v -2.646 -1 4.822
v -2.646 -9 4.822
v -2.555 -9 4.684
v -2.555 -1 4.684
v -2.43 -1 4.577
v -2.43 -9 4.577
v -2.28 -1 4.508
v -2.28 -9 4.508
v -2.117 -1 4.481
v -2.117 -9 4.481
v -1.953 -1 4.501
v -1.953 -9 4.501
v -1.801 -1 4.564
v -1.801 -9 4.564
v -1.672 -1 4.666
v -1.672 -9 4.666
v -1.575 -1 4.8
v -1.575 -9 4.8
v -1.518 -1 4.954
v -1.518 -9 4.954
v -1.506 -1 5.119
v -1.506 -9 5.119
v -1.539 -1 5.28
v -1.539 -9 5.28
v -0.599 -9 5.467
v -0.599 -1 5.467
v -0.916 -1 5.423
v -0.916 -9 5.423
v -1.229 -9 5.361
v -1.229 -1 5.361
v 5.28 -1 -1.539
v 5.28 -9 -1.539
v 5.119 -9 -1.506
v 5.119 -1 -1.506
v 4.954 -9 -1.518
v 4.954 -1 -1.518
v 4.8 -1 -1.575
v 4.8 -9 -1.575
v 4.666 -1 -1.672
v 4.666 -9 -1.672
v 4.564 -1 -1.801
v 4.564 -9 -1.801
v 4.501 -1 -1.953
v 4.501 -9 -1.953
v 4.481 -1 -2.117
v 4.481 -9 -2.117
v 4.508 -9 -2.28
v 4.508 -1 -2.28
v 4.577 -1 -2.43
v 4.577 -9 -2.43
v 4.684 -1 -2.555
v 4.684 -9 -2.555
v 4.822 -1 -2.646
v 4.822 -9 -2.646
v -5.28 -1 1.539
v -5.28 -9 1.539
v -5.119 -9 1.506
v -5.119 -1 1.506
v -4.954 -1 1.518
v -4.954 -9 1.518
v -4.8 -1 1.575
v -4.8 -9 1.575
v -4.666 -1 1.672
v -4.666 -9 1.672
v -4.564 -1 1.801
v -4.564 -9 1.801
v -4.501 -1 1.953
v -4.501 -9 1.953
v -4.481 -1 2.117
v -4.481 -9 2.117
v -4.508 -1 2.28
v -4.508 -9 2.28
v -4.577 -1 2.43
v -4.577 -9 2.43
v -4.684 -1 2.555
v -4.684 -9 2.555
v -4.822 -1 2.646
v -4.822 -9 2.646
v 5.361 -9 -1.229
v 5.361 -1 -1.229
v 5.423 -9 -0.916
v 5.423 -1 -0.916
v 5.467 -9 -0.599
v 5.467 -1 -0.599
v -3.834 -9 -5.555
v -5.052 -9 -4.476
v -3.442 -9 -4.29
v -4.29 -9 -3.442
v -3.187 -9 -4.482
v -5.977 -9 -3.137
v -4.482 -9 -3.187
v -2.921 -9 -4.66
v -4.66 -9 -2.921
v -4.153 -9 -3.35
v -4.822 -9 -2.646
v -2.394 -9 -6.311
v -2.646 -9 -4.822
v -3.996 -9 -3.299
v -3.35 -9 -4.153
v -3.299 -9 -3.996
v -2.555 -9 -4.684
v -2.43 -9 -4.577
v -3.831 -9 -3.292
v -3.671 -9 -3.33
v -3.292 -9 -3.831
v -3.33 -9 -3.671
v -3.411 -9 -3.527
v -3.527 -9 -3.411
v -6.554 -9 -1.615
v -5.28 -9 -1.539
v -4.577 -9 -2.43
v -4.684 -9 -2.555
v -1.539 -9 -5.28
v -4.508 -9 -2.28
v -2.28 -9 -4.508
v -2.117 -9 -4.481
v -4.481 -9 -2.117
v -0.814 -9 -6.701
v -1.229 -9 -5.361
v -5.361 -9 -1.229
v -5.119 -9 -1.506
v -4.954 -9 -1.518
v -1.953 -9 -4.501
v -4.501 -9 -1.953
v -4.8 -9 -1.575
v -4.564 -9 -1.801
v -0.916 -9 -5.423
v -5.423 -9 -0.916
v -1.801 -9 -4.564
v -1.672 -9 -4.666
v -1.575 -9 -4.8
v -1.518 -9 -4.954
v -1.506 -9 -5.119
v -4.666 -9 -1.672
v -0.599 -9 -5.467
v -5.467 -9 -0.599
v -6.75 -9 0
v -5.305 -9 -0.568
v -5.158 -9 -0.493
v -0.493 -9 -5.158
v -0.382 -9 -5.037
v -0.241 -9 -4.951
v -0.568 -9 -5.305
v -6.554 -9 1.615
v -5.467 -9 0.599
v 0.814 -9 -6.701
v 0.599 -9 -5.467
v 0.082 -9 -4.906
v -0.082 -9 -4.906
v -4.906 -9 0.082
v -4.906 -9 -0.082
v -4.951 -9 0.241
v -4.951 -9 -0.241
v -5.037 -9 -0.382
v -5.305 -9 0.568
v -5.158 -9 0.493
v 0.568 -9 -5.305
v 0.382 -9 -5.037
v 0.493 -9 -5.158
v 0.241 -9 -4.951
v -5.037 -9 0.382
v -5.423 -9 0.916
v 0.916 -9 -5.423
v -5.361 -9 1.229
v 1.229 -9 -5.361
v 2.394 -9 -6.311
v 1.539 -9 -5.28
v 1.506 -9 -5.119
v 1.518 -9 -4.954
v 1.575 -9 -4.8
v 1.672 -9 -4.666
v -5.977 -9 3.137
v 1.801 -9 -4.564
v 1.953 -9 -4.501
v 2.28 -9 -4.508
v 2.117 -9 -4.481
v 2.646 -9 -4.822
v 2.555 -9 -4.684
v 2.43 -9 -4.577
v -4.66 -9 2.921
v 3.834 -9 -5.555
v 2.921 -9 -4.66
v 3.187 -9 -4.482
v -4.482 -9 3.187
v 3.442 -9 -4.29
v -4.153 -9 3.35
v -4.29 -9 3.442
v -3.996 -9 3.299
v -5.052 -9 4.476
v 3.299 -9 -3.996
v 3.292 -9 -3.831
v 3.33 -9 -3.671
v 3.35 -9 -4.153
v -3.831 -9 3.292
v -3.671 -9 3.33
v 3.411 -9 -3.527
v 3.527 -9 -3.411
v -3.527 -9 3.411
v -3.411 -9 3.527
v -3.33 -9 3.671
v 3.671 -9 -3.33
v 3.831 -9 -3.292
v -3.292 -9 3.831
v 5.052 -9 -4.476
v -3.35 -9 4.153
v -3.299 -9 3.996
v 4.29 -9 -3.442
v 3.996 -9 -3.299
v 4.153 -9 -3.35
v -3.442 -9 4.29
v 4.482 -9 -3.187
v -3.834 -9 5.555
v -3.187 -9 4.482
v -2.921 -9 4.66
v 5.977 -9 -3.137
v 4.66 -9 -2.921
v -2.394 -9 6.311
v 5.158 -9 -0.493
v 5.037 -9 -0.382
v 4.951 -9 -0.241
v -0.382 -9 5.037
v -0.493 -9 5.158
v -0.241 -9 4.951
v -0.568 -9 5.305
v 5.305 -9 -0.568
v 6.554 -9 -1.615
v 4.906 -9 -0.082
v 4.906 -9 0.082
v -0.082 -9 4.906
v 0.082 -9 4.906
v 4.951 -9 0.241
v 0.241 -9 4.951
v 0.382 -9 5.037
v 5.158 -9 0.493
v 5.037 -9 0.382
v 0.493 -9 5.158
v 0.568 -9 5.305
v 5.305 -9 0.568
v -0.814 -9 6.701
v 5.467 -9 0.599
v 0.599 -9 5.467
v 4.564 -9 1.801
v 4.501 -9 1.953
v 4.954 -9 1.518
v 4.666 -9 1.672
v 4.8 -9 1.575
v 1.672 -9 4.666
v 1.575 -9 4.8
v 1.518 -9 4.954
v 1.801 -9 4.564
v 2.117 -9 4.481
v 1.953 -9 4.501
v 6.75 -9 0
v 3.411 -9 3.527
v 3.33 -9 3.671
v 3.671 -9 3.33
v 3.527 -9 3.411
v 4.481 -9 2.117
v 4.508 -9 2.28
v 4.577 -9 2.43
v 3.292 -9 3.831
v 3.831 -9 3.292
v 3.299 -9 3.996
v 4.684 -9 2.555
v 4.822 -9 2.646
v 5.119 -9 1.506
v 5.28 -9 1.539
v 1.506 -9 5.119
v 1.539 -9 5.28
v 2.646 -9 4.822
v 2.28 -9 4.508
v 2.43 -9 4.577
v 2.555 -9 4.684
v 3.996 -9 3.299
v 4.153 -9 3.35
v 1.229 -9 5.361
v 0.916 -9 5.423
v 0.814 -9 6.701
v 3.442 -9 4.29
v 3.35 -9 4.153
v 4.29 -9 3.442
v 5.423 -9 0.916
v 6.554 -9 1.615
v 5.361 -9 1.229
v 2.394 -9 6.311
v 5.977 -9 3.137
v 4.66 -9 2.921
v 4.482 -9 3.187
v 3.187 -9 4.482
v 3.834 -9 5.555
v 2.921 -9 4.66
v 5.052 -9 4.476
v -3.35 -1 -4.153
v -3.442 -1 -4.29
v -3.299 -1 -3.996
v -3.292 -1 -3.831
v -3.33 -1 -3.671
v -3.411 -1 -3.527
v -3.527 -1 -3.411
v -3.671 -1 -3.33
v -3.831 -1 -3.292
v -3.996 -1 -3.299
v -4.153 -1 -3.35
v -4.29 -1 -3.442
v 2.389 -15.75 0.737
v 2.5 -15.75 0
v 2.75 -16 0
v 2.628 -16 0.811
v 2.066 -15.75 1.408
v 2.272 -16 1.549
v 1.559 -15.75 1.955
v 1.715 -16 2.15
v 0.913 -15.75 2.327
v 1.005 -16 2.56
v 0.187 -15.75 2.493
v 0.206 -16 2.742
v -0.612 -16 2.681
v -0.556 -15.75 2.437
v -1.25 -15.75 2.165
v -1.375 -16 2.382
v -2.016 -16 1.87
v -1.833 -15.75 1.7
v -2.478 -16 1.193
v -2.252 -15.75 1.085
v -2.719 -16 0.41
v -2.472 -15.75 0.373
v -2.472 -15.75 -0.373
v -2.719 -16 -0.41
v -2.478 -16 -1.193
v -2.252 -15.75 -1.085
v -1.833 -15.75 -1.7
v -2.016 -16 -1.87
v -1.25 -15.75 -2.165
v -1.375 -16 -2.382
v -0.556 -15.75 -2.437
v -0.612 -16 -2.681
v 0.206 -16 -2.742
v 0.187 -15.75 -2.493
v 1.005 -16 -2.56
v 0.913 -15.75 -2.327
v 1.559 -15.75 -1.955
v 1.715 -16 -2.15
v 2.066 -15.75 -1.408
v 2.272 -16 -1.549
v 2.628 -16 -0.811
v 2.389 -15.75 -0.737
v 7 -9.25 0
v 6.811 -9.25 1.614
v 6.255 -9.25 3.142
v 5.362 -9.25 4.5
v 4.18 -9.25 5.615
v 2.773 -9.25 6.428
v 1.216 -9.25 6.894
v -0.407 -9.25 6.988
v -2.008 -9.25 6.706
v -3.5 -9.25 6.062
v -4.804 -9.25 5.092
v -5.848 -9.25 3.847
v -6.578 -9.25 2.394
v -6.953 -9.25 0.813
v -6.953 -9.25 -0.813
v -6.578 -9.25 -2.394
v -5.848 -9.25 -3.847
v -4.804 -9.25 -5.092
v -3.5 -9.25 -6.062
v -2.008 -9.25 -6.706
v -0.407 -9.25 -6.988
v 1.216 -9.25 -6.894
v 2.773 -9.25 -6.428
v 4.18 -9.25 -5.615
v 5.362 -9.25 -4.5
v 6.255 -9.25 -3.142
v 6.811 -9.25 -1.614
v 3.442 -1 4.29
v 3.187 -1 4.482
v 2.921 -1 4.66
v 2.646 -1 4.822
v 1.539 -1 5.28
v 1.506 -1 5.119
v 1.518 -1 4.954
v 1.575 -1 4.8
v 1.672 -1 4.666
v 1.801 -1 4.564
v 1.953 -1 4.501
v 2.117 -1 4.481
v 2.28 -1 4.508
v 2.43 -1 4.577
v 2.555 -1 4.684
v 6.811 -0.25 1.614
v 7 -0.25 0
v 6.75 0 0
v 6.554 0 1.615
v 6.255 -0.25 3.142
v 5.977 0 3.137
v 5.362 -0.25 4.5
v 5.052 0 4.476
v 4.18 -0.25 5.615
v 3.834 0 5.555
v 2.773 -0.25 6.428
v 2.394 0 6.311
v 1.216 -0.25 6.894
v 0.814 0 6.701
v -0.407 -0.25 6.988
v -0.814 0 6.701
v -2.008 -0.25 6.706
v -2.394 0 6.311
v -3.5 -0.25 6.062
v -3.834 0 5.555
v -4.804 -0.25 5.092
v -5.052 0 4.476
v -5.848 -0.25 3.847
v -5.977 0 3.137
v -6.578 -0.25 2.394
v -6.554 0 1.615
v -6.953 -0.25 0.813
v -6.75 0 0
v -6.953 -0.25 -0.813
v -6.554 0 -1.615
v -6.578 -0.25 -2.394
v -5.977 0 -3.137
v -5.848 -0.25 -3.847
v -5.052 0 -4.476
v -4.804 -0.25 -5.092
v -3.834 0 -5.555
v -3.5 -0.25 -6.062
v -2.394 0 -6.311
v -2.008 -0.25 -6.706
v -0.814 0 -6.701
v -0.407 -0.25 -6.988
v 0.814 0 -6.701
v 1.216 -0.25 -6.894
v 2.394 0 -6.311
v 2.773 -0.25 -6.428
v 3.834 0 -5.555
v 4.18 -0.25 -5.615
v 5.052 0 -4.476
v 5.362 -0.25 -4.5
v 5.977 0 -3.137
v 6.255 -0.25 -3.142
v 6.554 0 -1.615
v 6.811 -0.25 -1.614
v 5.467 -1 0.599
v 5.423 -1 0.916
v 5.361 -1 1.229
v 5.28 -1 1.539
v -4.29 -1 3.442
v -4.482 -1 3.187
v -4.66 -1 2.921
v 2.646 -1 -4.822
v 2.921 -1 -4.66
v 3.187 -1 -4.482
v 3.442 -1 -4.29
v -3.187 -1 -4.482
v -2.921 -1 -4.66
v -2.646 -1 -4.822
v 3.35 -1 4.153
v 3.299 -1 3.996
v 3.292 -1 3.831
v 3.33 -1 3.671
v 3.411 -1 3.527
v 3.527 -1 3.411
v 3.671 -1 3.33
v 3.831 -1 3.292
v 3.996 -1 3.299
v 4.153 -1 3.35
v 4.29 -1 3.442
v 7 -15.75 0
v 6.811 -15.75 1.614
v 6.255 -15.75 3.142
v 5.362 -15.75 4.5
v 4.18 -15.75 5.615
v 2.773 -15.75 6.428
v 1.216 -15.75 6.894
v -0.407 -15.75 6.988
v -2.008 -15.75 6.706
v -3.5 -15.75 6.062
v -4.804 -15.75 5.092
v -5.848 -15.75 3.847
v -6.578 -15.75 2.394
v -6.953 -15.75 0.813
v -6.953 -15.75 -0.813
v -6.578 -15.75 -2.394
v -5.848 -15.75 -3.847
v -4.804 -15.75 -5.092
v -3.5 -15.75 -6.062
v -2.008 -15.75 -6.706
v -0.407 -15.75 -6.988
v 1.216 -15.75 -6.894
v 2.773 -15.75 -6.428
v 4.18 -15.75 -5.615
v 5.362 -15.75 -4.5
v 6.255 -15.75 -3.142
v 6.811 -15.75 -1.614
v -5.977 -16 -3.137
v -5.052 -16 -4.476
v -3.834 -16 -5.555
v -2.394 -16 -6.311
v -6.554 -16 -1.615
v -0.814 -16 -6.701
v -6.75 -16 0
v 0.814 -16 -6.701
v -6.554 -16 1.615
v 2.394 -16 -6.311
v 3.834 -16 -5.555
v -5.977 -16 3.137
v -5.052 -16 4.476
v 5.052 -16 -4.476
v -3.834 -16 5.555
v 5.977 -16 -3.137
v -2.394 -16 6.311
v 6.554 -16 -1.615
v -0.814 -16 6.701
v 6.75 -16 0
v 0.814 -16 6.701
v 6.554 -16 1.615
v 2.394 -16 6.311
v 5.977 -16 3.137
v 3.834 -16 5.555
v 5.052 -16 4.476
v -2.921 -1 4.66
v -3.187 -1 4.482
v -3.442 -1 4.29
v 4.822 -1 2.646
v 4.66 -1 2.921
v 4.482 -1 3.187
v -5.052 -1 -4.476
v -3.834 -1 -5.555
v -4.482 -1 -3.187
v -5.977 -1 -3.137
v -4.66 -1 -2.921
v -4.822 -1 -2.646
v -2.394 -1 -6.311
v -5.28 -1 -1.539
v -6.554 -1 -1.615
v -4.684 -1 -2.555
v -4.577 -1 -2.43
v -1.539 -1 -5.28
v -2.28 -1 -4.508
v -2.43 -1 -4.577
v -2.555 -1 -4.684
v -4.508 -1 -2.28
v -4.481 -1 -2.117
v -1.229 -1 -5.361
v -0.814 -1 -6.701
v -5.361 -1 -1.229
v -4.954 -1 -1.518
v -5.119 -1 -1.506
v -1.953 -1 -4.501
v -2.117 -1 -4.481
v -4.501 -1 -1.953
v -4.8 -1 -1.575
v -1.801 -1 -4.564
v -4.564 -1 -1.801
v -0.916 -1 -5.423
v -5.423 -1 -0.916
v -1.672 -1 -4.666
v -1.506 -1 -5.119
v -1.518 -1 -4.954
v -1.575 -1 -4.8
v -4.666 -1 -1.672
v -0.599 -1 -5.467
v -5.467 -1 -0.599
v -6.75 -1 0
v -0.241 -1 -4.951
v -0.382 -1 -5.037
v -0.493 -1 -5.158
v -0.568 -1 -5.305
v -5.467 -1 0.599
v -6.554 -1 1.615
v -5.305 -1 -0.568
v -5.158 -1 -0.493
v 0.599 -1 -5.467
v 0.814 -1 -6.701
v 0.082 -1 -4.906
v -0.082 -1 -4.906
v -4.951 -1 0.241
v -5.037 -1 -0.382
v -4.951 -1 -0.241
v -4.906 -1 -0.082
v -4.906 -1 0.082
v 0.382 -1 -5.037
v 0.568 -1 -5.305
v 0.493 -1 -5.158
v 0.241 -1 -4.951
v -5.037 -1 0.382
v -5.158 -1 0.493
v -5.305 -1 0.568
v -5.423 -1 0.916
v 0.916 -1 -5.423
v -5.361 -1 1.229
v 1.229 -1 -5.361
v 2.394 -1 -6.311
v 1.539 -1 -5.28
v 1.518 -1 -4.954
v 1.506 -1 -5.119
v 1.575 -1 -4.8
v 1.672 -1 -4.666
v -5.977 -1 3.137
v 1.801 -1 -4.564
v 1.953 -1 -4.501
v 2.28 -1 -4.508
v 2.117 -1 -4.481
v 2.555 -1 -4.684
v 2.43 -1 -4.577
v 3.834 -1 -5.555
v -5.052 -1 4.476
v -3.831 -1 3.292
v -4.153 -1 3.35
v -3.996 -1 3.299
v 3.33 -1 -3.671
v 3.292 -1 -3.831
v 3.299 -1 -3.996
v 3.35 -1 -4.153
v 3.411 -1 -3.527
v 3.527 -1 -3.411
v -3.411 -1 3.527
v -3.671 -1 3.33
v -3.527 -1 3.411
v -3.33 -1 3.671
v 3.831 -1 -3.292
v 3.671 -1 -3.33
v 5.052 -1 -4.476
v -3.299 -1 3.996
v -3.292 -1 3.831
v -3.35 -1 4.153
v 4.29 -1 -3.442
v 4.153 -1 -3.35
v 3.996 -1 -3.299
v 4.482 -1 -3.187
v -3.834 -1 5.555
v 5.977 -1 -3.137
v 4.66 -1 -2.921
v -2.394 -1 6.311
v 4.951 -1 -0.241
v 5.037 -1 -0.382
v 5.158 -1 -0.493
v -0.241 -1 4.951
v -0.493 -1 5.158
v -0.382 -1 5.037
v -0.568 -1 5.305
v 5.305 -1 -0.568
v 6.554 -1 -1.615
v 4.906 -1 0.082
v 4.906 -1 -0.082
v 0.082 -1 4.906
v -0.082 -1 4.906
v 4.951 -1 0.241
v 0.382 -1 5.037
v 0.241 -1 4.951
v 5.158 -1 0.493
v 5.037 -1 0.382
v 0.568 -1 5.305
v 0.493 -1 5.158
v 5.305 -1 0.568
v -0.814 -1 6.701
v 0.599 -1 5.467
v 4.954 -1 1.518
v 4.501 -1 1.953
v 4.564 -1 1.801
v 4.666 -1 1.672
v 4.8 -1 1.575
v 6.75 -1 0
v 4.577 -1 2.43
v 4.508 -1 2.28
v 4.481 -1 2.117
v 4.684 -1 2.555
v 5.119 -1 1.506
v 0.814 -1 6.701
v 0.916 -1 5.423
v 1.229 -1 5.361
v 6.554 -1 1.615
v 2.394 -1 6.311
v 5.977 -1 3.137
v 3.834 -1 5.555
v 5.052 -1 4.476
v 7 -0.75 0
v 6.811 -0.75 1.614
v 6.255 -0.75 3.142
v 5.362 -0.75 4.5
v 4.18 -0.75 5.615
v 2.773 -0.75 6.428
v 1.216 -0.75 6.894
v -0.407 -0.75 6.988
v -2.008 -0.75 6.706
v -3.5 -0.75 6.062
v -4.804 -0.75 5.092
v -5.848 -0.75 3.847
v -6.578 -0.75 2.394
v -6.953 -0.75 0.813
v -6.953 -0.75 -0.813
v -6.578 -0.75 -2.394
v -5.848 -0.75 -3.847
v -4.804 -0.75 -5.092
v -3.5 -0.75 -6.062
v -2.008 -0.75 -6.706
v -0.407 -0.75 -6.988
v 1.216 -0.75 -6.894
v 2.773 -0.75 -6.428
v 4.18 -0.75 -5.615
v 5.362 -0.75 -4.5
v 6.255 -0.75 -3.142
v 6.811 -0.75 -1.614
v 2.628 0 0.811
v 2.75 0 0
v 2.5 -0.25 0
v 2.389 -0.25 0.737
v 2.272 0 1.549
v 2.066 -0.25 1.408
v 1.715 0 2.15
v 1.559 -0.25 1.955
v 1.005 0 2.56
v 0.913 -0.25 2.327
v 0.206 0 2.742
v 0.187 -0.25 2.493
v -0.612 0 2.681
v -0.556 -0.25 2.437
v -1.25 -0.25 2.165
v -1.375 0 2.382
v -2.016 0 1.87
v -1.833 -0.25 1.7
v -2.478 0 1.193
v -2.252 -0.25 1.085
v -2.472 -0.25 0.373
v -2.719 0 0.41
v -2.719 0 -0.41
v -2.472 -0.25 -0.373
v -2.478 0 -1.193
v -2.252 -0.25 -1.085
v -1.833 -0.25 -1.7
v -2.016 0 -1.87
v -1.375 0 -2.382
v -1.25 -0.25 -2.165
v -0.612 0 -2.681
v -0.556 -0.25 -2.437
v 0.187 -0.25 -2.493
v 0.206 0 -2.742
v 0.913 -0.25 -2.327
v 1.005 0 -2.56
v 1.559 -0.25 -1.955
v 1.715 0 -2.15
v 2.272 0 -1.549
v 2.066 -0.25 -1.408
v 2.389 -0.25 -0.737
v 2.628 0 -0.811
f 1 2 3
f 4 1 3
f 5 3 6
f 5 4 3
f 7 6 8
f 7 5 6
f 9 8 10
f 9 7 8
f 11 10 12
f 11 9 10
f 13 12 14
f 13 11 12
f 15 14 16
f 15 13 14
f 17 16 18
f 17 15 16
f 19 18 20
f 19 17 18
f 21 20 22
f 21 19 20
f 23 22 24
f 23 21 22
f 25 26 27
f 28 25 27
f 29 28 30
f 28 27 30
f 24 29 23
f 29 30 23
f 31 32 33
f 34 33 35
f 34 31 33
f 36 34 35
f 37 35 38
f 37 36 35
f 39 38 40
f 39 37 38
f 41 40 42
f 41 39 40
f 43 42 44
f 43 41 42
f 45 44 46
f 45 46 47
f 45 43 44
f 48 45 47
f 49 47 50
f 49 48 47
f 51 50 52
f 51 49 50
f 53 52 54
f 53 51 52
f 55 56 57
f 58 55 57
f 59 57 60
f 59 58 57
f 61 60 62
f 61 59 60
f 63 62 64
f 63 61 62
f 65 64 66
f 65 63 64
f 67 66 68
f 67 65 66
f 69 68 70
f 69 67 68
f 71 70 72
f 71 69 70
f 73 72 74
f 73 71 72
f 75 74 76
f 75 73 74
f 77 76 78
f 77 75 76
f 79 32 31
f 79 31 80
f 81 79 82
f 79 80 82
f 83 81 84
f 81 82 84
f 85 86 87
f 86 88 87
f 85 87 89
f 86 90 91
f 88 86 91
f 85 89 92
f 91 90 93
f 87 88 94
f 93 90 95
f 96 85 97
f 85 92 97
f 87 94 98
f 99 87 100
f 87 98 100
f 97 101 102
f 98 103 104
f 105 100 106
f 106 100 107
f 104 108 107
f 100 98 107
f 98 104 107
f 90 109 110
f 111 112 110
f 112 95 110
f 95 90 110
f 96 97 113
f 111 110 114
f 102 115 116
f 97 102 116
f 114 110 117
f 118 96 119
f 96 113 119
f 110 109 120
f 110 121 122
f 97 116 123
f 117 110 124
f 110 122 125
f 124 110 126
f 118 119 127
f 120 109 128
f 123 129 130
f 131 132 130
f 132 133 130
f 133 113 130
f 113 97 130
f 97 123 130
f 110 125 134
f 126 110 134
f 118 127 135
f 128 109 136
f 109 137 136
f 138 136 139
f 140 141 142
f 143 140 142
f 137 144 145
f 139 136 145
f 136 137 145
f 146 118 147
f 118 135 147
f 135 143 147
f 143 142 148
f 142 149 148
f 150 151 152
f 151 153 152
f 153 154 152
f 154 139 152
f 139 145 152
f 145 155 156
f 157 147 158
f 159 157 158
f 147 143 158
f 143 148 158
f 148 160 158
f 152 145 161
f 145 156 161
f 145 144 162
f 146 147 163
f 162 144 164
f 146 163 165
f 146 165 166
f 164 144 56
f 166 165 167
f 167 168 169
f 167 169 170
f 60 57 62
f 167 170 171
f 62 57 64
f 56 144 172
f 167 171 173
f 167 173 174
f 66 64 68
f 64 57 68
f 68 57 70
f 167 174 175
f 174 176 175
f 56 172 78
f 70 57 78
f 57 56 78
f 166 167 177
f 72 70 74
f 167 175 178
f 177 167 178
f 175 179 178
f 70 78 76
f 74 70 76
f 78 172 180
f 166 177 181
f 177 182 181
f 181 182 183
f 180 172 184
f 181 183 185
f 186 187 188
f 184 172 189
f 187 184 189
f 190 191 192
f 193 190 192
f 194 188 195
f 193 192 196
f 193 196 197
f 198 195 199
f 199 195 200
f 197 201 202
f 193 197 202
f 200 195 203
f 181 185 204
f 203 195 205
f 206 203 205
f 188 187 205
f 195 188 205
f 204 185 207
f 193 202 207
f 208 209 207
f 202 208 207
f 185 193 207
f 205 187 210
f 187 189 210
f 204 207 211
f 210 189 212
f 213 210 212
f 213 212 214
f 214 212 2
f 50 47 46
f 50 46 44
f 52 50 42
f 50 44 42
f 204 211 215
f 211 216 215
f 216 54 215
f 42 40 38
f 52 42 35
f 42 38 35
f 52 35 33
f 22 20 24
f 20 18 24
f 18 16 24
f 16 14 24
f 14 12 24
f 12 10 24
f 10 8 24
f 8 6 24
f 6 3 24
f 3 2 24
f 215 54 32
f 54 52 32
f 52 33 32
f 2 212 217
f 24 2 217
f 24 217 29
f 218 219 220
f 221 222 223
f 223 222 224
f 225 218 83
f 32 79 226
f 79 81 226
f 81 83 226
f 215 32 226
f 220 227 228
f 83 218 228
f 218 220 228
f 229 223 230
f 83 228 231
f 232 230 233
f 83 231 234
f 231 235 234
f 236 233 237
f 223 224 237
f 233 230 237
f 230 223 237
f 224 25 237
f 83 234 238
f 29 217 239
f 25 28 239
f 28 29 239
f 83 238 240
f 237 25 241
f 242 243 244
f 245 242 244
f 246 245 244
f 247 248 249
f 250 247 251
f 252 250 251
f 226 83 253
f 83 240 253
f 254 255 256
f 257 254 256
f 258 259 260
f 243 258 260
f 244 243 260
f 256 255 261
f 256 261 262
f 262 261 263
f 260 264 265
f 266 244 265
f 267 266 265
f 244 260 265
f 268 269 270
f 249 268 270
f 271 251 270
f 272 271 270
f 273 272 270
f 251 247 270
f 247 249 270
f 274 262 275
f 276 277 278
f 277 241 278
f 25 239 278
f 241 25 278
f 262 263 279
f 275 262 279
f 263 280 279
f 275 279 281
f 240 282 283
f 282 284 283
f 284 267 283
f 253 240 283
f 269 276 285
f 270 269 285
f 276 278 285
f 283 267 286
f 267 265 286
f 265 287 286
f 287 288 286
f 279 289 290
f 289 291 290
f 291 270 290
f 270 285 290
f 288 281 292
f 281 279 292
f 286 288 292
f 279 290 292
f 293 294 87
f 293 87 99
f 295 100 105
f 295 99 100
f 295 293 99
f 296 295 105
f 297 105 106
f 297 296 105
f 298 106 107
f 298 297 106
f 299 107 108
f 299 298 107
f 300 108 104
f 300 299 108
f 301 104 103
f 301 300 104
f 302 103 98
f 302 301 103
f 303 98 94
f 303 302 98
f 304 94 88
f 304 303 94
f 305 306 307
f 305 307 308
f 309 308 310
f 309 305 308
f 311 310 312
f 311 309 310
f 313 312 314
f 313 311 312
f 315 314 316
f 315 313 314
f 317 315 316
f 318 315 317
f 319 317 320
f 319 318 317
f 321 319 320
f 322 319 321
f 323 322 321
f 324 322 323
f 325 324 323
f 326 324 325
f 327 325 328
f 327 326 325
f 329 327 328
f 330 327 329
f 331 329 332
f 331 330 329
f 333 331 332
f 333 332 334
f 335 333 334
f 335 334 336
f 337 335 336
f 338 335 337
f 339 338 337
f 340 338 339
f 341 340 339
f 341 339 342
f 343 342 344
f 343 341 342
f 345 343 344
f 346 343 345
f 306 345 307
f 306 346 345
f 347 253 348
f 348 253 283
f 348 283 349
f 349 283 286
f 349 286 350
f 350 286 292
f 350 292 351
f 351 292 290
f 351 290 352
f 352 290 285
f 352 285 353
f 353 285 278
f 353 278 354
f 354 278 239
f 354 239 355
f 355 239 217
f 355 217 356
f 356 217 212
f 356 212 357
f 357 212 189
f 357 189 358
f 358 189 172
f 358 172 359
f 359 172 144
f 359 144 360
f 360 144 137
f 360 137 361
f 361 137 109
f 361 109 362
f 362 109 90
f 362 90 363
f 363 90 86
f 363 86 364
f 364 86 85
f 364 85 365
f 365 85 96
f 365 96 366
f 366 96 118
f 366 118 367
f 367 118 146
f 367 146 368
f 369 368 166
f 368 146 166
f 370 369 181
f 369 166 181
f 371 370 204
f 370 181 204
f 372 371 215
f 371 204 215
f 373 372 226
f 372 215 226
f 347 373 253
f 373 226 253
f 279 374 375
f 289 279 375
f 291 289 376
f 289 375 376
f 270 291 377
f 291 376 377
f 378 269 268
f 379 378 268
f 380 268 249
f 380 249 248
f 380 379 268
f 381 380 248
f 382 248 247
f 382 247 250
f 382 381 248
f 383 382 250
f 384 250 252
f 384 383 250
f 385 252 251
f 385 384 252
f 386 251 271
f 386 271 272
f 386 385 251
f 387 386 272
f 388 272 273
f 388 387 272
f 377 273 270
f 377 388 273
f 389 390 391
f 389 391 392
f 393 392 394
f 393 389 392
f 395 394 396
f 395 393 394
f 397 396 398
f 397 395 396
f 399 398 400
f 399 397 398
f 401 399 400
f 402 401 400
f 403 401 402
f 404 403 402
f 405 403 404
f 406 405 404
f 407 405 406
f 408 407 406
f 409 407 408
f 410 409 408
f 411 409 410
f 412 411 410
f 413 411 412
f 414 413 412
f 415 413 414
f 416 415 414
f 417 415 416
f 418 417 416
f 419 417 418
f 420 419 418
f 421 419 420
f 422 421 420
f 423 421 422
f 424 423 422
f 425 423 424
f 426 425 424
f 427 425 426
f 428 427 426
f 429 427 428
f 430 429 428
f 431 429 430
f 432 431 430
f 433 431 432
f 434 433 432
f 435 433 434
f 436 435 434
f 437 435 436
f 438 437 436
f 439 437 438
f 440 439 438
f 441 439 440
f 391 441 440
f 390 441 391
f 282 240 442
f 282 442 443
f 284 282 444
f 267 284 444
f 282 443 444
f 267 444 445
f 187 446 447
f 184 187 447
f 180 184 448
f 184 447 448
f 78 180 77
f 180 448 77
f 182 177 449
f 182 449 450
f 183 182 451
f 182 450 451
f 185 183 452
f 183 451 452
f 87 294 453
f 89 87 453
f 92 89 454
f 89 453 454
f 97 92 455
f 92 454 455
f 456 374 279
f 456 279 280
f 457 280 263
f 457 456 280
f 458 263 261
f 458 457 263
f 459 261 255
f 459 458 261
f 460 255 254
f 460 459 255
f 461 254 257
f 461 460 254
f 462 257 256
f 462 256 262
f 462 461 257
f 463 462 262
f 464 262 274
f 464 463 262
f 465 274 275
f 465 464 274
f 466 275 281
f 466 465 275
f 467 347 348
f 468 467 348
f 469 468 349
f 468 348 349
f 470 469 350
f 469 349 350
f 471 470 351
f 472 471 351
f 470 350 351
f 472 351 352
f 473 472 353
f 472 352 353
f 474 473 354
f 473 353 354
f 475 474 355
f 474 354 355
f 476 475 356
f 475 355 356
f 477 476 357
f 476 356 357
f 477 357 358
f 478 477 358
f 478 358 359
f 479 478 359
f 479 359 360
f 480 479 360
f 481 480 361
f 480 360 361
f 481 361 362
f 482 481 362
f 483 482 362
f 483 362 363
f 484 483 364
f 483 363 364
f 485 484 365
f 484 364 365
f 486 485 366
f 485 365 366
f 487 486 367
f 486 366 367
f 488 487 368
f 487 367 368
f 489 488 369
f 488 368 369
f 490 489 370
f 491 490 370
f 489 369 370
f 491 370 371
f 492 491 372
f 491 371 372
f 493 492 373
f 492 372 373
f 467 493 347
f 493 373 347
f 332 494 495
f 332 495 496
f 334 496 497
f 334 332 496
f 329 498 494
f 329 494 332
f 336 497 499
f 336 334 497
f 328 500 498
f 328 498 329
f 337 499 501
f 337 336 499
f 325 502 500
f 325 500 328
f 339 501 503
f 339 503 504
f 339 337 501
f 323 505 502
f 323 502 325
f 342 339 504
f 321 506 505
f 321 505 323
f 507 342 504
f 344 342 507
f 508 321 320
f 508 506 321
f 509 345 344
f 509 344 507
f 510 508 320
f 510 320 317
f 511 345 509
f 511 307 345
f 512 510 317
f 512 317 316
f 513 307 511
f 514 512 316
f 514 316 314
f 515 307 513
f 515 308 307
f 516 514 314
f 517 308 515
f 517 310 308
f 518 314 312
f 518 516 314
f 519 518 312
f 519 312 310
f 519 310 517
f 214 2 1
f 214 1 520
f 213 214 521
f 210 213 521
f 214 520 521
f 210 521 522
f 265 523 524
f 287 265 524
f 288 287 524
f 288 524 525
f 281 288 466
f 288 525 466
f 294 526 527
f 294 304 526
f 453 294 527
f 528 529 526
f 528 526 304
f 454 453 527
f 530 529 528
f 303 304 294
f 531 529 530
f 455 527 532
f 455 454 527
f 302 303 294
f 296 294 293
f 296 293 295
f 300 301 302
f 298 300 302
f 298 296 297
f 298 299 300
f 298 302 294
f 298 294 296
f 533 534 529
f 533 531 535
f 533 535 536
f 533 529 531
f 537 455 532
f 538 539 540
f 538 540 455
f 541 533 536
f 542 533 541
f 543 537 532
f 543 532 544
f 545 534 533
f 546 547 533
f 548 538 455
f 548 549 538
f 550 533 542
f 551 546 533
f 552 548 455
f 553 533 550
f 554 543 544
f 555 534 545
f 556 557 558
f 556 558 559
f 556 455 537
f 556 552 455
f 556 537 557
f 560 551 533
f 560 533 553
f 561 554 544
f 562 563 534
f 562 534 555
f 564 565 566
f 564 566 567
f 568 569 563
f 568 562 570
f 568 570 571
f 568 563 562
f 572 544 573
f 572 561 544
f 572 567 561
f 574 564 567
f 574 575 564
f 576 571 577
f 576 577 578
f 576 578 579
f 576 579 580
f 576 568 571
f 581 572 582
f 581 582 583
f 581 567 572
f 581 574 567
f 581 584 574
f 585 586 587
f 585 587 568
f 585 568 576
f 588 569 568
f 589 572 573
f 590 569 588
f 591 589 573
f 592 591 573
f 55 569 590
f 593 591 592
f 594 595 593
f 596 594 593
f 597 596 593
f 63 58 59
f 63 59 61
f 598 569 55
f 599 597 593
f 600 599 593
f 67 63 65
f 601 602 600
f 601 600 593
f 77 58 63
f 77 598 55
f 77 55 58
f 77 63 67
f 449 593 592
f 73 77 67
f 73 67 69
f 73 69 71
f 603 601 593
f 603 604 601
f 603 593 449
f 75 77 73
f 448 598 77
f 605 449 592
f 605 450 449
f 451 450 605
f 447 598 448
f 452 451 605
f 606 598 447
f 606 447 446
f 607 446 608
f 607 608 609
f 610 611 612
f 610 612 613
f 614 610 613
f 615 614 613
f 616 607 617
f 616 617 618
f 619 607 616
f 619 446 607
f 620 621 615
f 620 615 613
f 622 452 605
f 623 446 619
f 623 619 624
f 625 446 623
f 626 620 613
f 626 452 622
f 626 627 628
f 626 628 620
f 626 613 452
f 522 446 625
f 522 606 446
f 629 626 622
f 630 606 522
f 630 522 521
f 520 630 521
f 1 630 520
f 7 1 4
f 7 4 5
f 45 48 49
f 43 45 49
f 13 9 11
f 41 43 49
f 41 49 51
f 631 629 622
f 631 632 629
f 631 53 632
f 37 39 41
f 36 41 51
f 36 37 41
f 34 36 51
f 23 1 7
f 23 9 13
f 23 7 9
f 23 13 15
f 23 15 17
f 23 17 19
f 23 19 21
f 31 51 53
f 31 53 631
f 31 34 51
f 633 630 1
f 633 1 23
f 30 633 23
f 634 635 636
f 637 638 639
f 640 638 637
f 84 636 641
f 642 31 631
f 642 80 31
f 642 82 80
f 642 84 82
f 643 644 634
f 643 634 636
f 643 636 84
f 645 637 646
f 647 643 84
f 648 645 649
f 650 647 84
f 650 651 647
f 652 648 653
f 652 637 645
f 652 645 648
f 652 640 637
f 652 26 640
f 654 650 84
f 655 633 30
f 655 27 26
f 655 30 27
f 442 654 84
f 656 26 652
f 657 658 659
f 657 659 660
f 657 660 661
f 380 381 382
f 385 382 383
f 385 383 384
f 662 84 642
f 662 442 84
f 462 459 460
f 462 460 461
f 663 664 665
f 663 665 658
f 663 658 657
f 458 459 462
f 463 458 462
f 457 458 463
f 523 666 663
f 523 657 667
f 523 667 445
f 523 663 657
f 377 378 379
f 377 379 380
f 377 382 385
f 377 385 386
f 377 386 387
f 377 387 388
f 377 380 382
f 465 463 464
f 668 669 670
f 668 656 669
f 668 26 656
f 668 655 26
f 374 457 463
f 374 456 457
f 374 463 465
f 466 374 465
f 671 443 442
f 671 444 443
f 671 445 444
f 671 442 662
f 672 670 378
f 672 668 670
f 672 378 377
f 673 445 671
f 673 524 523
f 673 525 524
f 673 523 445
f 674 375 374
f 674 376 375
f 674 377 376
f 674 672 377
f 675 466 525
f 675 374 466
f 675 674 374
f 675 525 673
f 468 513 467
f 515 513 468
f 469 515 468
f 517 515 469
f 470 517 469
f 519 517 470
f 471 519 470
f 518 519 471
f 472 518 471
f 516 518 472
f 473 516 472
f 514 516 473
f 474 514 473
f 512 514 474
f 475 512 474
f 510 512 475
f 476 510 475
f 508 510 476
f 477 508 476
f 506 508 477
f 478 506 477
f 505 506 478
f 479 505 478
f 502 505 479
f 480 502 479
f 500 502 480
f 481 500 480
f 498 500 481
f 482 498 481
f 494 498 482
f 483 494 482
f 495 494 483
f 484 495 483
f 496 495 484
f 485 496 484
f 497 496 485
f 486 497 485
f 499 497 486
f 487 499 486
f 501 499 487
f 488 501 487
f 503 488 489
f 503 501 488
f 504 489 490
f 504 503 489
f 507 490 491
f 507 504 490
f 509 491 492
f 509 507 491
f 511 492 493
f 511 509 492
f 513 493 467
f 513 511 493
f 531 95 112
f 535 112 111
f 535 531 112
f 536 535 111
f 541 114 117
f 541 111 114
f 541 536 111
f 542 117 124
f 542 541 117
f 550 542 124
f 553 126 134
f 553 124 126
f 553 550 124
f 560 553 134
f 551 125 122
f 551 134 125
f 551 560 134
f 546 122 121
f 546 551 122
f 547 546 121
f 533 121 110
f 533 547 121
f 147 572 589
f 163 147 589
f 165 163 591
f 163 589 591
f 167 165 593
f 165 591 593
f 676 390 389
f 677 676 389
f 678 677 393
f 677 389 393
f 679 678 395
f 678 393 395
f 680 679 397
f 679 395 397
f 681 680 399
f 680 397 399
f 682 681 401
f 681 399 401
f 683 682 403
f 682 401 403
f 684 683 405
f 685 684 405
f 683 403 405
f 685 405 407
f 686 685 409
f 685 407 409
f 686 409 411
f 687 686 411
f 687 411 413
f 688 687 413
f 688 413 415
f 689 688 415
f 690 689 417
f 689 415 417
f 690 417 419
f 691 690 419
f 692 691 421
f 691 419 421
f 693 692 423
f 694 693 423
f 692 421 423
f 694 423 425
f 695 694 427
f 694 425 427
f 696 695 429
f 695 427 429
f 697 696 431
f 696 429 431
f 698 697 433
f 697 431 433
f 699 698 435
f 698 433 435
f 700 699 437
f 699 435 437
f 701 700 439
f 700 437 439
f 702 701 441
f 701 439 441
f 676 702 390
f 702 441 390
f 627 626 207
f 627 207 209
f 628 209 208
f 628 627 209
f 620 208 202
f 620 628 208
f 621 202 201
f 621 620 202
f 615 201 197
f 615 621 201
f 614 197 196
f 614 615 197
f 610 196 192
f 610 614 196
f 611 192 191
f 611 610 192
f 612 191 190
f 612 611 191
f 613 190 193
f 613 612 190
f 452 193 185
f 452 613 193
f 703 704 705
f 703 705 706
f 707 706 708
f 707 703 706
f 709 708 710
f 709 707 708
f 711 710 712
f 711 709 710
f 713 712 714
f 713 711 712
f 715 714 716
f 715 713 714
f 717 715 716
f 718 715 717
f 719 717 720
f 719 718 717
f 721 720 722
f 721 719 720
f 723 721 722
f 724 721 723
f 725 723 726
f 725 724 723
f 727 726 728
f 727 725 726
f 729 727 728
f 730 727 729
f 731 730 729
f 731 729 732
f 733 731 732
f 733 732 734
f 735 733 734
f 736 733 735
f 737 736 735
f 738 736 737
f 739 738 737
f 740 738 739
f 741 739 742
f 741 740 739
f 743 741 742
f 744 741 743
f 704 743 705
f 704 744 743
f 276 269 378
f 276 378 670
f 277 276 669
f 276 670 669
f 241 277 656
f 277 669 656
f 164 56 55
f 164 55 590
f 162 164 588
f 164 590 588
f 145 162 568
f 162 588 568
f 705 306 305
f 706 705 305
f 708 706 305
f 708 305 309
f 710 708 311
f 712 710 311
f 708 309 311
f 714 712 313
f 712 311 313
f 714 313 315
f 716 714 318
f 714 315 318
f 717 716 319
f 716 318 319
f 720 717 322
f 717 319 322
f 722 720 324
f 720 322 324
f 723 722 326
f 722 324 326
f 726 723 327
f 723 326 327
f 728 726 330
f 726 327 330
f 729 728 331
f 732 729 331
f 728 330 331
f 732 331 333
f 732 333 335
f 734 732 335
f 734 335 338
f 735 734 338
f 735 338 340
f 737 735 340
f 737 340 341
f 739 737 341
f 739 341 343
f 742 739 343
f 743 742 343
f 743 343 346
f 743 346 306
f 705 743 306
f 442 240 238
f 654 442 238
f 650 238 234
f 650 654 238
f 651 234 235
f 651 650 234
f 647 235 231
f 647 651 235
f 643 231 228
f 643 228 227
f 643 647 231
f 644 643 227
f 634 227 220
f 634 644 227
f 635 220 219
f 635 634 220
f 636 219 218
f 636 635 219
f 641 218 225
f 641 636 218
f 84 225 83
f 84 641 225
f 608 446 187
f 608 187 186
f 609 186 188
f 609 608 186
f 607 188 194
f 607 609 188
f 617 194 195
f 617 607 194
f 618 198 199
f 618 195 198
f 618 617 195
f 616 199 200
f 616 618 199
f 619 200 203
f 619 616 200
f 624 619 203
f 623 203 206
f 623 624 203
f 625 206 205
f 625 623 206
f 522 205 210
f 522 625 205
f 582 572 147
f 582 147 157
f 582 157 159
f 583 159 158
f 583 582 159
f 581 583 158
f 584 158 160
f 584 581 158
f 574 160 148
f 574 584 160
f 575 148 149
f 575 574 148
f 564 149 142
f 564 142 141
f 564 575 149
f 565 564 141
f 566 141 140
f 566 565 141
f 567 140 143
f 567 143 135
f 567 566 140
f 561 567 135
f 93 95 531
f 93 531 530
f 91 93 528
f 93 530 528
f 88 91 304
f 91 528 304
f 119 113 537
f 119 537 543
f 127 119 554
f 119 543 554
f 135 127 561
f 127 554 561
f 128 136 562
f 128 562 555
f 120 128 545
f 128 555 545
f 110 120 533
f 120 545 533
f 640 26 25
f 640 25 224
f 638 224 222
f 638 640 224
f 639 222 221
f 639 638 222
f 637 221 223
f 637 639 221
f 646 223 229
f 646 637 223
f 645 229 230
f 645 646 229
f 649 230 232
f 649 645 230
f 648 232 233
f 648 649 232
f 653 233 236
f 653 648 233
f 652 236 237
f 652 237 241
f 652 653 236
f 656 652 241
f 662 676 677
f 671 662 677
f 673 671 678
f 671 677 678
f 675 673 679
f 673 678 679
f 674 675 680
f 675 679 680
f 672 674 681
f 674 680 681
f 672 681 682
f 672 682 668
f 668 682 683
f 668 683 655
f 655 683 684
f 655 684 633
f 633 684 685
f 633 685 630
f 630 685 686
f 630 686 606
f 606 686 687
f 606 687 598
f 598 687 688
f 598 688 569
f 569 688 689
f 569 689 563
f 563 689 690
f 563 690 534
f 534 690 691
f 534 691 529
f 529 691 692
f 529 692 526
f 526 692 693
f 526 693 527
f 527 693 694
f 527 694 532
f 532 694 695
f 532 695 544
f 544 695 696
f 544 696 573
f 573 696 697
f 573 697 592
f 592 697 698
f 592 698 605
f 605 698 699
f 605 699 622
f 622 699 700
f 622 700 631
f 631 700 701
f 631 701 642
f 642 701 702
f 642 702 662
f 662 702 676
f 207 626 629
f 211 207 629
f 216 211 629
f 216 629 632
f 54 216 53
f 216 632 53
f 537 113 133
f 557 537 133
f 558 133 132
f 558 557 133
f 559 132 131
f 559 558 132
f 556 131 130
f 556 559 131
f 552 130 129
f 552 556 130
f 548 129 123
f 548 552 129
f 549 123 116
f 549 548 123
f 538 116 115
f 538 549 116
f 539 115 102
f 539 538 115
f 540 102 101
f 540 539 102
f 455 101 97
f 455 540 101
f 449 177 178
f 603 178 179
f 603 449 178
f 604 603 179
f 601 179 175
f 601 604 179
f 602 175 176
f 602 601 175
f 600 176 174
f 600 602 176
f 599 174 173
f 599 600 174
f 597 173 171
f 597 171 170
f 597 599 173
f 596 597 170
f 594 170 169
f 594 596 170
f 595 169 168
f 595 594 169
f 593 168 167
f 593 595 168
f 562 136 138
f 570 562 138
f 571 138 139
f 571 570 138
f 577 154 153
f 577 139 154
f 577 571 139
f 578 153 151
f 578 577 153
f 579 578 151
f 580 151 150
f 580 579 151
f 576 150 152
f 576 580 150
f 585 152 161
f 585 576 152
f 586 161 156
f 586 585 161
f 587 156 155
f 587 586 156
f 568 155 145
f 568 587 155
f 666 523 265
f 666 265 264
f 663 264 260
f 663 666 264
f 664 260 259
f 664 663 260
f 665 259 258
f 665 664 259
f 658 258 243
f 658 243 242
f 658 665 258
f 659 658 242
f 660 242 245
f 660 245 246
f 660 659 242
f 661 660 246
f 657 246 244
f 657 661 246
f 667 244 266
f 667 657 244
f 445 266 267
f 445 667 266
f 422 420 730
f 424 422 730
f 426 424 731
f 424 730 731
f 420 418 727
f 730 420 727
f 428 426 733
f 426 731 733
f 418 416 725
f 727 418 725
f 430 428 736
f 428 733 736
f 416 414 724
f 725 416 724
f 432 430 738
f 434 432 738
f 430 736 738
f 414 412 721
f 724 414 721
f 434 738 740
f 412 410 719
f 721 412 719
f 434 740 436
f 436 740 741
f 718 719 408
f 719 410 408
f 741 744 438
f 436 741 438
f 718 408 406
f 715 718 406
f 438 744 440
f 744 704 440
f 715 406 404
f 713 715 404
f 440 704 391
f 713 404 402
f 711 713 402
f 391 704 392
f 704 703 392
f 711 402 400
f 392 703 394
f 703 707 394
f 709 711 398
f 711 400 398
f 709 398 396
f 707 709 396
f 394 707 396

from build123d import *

# Parameters (mm, degrees)
F0_R     = 7
F1_DEPTH = 1
F2_R     = 5.5
F3_DEPTH = 8
F4_R     = 7
F5_DEPTH = 7
F6_R     = 0.6
F7_DEPTH = 8
F8_R     = 2.5
F9_DEPTH = 16.001
F10_SIZE = 0.25


with BuildPart() as f1:
    # F0 (on Front) → F1 (new body)
    with BuildSketch(Plane.XZ):
        Circle(F0_R)
    extrude(amount=F1_DEPTH)

    # F2 (on face) → F3 (join)
    with BuildSketch(Plane.XZ.offset(1)):
        Circle(F2_R)
    extrude(amount=F3_DEPTH)

    # F4 (on face) → F5 (join)
    with BuildSketch(Plane.XZ.offset(9)):
        Circle(F4_R)
    extrude(amount=F5_DEPTH)

    # F6 (on face) → F7 (cut, through all)
    with BuildSketch(Plane.XZ.offset(1)):
        with Locations((0, 5.5)):
            Circle(F6_R)
        with Locations((-2.104759, 5.081337)):
            Circle(F6_R)
        with Locations((-3.889087, 3.889087)):
            Circle(F6_R)
        with Locations((-5.081337, 2.104759)):
            Circle(F6_R)
        with Locations((-5.5, 0)):
            Circle(F6_R)
        with Locations((-5.081337, -2.104759)):
            Circle(F6_R)
        with Locations((-3.889087, -3.889087)):
            Circle(F6_R)
        with Locations((-2.104759, -5.081337)):
            Circle(F6_R)
        with Locations((0, -5.5)):
            Circle(F6_R)
        with Locations((2.104759, -5.081337)):
            Circle(F6_R)
        with Locations((3.889087, -3.889087)):
            Circle(F6_R)
        with Locations((5.081337, -2.104759)):
            Circle(F6_R)
        with Locations((5.5, 0)):
            Circle(F6_R)
        with Locations((5.081337, 2.104759)):
            Circle(F6_R)
        with Locations((3.889087, 3.889087)):
            Circle(F6_R)
        with Locations((2.104759, 5.081337)):
            Circle(F6_R)
    extrude(amount=F7_DEPTH, mode=Mode.SUBTRACT)

    # F8 (on face) → F9 (cut, through all)
    with BuildSketch(Plane.XZ.offset(16)):
        Circle(F8_R)
    extrude(amount=-F9_DEPTH, mode=Mode.SUBTRACT)

    # F10
    f10_edges = [f1.edges().sort_by_distance(p)[0] for p in [
        (7, -12.5, 0),
        (-7, -9, 0),
        (-7, -16, 0),
        (7, -0.5, 0),
        (-7, 0, 0),
        (-7, -1, 0),
        (-2.5, -16, 0),
        (2.5, -8, 0),
        (-2.5, 0, 0),
    ]]
    chamfer(f10_edges, length=F10_SIZE)


solid = f1.part
